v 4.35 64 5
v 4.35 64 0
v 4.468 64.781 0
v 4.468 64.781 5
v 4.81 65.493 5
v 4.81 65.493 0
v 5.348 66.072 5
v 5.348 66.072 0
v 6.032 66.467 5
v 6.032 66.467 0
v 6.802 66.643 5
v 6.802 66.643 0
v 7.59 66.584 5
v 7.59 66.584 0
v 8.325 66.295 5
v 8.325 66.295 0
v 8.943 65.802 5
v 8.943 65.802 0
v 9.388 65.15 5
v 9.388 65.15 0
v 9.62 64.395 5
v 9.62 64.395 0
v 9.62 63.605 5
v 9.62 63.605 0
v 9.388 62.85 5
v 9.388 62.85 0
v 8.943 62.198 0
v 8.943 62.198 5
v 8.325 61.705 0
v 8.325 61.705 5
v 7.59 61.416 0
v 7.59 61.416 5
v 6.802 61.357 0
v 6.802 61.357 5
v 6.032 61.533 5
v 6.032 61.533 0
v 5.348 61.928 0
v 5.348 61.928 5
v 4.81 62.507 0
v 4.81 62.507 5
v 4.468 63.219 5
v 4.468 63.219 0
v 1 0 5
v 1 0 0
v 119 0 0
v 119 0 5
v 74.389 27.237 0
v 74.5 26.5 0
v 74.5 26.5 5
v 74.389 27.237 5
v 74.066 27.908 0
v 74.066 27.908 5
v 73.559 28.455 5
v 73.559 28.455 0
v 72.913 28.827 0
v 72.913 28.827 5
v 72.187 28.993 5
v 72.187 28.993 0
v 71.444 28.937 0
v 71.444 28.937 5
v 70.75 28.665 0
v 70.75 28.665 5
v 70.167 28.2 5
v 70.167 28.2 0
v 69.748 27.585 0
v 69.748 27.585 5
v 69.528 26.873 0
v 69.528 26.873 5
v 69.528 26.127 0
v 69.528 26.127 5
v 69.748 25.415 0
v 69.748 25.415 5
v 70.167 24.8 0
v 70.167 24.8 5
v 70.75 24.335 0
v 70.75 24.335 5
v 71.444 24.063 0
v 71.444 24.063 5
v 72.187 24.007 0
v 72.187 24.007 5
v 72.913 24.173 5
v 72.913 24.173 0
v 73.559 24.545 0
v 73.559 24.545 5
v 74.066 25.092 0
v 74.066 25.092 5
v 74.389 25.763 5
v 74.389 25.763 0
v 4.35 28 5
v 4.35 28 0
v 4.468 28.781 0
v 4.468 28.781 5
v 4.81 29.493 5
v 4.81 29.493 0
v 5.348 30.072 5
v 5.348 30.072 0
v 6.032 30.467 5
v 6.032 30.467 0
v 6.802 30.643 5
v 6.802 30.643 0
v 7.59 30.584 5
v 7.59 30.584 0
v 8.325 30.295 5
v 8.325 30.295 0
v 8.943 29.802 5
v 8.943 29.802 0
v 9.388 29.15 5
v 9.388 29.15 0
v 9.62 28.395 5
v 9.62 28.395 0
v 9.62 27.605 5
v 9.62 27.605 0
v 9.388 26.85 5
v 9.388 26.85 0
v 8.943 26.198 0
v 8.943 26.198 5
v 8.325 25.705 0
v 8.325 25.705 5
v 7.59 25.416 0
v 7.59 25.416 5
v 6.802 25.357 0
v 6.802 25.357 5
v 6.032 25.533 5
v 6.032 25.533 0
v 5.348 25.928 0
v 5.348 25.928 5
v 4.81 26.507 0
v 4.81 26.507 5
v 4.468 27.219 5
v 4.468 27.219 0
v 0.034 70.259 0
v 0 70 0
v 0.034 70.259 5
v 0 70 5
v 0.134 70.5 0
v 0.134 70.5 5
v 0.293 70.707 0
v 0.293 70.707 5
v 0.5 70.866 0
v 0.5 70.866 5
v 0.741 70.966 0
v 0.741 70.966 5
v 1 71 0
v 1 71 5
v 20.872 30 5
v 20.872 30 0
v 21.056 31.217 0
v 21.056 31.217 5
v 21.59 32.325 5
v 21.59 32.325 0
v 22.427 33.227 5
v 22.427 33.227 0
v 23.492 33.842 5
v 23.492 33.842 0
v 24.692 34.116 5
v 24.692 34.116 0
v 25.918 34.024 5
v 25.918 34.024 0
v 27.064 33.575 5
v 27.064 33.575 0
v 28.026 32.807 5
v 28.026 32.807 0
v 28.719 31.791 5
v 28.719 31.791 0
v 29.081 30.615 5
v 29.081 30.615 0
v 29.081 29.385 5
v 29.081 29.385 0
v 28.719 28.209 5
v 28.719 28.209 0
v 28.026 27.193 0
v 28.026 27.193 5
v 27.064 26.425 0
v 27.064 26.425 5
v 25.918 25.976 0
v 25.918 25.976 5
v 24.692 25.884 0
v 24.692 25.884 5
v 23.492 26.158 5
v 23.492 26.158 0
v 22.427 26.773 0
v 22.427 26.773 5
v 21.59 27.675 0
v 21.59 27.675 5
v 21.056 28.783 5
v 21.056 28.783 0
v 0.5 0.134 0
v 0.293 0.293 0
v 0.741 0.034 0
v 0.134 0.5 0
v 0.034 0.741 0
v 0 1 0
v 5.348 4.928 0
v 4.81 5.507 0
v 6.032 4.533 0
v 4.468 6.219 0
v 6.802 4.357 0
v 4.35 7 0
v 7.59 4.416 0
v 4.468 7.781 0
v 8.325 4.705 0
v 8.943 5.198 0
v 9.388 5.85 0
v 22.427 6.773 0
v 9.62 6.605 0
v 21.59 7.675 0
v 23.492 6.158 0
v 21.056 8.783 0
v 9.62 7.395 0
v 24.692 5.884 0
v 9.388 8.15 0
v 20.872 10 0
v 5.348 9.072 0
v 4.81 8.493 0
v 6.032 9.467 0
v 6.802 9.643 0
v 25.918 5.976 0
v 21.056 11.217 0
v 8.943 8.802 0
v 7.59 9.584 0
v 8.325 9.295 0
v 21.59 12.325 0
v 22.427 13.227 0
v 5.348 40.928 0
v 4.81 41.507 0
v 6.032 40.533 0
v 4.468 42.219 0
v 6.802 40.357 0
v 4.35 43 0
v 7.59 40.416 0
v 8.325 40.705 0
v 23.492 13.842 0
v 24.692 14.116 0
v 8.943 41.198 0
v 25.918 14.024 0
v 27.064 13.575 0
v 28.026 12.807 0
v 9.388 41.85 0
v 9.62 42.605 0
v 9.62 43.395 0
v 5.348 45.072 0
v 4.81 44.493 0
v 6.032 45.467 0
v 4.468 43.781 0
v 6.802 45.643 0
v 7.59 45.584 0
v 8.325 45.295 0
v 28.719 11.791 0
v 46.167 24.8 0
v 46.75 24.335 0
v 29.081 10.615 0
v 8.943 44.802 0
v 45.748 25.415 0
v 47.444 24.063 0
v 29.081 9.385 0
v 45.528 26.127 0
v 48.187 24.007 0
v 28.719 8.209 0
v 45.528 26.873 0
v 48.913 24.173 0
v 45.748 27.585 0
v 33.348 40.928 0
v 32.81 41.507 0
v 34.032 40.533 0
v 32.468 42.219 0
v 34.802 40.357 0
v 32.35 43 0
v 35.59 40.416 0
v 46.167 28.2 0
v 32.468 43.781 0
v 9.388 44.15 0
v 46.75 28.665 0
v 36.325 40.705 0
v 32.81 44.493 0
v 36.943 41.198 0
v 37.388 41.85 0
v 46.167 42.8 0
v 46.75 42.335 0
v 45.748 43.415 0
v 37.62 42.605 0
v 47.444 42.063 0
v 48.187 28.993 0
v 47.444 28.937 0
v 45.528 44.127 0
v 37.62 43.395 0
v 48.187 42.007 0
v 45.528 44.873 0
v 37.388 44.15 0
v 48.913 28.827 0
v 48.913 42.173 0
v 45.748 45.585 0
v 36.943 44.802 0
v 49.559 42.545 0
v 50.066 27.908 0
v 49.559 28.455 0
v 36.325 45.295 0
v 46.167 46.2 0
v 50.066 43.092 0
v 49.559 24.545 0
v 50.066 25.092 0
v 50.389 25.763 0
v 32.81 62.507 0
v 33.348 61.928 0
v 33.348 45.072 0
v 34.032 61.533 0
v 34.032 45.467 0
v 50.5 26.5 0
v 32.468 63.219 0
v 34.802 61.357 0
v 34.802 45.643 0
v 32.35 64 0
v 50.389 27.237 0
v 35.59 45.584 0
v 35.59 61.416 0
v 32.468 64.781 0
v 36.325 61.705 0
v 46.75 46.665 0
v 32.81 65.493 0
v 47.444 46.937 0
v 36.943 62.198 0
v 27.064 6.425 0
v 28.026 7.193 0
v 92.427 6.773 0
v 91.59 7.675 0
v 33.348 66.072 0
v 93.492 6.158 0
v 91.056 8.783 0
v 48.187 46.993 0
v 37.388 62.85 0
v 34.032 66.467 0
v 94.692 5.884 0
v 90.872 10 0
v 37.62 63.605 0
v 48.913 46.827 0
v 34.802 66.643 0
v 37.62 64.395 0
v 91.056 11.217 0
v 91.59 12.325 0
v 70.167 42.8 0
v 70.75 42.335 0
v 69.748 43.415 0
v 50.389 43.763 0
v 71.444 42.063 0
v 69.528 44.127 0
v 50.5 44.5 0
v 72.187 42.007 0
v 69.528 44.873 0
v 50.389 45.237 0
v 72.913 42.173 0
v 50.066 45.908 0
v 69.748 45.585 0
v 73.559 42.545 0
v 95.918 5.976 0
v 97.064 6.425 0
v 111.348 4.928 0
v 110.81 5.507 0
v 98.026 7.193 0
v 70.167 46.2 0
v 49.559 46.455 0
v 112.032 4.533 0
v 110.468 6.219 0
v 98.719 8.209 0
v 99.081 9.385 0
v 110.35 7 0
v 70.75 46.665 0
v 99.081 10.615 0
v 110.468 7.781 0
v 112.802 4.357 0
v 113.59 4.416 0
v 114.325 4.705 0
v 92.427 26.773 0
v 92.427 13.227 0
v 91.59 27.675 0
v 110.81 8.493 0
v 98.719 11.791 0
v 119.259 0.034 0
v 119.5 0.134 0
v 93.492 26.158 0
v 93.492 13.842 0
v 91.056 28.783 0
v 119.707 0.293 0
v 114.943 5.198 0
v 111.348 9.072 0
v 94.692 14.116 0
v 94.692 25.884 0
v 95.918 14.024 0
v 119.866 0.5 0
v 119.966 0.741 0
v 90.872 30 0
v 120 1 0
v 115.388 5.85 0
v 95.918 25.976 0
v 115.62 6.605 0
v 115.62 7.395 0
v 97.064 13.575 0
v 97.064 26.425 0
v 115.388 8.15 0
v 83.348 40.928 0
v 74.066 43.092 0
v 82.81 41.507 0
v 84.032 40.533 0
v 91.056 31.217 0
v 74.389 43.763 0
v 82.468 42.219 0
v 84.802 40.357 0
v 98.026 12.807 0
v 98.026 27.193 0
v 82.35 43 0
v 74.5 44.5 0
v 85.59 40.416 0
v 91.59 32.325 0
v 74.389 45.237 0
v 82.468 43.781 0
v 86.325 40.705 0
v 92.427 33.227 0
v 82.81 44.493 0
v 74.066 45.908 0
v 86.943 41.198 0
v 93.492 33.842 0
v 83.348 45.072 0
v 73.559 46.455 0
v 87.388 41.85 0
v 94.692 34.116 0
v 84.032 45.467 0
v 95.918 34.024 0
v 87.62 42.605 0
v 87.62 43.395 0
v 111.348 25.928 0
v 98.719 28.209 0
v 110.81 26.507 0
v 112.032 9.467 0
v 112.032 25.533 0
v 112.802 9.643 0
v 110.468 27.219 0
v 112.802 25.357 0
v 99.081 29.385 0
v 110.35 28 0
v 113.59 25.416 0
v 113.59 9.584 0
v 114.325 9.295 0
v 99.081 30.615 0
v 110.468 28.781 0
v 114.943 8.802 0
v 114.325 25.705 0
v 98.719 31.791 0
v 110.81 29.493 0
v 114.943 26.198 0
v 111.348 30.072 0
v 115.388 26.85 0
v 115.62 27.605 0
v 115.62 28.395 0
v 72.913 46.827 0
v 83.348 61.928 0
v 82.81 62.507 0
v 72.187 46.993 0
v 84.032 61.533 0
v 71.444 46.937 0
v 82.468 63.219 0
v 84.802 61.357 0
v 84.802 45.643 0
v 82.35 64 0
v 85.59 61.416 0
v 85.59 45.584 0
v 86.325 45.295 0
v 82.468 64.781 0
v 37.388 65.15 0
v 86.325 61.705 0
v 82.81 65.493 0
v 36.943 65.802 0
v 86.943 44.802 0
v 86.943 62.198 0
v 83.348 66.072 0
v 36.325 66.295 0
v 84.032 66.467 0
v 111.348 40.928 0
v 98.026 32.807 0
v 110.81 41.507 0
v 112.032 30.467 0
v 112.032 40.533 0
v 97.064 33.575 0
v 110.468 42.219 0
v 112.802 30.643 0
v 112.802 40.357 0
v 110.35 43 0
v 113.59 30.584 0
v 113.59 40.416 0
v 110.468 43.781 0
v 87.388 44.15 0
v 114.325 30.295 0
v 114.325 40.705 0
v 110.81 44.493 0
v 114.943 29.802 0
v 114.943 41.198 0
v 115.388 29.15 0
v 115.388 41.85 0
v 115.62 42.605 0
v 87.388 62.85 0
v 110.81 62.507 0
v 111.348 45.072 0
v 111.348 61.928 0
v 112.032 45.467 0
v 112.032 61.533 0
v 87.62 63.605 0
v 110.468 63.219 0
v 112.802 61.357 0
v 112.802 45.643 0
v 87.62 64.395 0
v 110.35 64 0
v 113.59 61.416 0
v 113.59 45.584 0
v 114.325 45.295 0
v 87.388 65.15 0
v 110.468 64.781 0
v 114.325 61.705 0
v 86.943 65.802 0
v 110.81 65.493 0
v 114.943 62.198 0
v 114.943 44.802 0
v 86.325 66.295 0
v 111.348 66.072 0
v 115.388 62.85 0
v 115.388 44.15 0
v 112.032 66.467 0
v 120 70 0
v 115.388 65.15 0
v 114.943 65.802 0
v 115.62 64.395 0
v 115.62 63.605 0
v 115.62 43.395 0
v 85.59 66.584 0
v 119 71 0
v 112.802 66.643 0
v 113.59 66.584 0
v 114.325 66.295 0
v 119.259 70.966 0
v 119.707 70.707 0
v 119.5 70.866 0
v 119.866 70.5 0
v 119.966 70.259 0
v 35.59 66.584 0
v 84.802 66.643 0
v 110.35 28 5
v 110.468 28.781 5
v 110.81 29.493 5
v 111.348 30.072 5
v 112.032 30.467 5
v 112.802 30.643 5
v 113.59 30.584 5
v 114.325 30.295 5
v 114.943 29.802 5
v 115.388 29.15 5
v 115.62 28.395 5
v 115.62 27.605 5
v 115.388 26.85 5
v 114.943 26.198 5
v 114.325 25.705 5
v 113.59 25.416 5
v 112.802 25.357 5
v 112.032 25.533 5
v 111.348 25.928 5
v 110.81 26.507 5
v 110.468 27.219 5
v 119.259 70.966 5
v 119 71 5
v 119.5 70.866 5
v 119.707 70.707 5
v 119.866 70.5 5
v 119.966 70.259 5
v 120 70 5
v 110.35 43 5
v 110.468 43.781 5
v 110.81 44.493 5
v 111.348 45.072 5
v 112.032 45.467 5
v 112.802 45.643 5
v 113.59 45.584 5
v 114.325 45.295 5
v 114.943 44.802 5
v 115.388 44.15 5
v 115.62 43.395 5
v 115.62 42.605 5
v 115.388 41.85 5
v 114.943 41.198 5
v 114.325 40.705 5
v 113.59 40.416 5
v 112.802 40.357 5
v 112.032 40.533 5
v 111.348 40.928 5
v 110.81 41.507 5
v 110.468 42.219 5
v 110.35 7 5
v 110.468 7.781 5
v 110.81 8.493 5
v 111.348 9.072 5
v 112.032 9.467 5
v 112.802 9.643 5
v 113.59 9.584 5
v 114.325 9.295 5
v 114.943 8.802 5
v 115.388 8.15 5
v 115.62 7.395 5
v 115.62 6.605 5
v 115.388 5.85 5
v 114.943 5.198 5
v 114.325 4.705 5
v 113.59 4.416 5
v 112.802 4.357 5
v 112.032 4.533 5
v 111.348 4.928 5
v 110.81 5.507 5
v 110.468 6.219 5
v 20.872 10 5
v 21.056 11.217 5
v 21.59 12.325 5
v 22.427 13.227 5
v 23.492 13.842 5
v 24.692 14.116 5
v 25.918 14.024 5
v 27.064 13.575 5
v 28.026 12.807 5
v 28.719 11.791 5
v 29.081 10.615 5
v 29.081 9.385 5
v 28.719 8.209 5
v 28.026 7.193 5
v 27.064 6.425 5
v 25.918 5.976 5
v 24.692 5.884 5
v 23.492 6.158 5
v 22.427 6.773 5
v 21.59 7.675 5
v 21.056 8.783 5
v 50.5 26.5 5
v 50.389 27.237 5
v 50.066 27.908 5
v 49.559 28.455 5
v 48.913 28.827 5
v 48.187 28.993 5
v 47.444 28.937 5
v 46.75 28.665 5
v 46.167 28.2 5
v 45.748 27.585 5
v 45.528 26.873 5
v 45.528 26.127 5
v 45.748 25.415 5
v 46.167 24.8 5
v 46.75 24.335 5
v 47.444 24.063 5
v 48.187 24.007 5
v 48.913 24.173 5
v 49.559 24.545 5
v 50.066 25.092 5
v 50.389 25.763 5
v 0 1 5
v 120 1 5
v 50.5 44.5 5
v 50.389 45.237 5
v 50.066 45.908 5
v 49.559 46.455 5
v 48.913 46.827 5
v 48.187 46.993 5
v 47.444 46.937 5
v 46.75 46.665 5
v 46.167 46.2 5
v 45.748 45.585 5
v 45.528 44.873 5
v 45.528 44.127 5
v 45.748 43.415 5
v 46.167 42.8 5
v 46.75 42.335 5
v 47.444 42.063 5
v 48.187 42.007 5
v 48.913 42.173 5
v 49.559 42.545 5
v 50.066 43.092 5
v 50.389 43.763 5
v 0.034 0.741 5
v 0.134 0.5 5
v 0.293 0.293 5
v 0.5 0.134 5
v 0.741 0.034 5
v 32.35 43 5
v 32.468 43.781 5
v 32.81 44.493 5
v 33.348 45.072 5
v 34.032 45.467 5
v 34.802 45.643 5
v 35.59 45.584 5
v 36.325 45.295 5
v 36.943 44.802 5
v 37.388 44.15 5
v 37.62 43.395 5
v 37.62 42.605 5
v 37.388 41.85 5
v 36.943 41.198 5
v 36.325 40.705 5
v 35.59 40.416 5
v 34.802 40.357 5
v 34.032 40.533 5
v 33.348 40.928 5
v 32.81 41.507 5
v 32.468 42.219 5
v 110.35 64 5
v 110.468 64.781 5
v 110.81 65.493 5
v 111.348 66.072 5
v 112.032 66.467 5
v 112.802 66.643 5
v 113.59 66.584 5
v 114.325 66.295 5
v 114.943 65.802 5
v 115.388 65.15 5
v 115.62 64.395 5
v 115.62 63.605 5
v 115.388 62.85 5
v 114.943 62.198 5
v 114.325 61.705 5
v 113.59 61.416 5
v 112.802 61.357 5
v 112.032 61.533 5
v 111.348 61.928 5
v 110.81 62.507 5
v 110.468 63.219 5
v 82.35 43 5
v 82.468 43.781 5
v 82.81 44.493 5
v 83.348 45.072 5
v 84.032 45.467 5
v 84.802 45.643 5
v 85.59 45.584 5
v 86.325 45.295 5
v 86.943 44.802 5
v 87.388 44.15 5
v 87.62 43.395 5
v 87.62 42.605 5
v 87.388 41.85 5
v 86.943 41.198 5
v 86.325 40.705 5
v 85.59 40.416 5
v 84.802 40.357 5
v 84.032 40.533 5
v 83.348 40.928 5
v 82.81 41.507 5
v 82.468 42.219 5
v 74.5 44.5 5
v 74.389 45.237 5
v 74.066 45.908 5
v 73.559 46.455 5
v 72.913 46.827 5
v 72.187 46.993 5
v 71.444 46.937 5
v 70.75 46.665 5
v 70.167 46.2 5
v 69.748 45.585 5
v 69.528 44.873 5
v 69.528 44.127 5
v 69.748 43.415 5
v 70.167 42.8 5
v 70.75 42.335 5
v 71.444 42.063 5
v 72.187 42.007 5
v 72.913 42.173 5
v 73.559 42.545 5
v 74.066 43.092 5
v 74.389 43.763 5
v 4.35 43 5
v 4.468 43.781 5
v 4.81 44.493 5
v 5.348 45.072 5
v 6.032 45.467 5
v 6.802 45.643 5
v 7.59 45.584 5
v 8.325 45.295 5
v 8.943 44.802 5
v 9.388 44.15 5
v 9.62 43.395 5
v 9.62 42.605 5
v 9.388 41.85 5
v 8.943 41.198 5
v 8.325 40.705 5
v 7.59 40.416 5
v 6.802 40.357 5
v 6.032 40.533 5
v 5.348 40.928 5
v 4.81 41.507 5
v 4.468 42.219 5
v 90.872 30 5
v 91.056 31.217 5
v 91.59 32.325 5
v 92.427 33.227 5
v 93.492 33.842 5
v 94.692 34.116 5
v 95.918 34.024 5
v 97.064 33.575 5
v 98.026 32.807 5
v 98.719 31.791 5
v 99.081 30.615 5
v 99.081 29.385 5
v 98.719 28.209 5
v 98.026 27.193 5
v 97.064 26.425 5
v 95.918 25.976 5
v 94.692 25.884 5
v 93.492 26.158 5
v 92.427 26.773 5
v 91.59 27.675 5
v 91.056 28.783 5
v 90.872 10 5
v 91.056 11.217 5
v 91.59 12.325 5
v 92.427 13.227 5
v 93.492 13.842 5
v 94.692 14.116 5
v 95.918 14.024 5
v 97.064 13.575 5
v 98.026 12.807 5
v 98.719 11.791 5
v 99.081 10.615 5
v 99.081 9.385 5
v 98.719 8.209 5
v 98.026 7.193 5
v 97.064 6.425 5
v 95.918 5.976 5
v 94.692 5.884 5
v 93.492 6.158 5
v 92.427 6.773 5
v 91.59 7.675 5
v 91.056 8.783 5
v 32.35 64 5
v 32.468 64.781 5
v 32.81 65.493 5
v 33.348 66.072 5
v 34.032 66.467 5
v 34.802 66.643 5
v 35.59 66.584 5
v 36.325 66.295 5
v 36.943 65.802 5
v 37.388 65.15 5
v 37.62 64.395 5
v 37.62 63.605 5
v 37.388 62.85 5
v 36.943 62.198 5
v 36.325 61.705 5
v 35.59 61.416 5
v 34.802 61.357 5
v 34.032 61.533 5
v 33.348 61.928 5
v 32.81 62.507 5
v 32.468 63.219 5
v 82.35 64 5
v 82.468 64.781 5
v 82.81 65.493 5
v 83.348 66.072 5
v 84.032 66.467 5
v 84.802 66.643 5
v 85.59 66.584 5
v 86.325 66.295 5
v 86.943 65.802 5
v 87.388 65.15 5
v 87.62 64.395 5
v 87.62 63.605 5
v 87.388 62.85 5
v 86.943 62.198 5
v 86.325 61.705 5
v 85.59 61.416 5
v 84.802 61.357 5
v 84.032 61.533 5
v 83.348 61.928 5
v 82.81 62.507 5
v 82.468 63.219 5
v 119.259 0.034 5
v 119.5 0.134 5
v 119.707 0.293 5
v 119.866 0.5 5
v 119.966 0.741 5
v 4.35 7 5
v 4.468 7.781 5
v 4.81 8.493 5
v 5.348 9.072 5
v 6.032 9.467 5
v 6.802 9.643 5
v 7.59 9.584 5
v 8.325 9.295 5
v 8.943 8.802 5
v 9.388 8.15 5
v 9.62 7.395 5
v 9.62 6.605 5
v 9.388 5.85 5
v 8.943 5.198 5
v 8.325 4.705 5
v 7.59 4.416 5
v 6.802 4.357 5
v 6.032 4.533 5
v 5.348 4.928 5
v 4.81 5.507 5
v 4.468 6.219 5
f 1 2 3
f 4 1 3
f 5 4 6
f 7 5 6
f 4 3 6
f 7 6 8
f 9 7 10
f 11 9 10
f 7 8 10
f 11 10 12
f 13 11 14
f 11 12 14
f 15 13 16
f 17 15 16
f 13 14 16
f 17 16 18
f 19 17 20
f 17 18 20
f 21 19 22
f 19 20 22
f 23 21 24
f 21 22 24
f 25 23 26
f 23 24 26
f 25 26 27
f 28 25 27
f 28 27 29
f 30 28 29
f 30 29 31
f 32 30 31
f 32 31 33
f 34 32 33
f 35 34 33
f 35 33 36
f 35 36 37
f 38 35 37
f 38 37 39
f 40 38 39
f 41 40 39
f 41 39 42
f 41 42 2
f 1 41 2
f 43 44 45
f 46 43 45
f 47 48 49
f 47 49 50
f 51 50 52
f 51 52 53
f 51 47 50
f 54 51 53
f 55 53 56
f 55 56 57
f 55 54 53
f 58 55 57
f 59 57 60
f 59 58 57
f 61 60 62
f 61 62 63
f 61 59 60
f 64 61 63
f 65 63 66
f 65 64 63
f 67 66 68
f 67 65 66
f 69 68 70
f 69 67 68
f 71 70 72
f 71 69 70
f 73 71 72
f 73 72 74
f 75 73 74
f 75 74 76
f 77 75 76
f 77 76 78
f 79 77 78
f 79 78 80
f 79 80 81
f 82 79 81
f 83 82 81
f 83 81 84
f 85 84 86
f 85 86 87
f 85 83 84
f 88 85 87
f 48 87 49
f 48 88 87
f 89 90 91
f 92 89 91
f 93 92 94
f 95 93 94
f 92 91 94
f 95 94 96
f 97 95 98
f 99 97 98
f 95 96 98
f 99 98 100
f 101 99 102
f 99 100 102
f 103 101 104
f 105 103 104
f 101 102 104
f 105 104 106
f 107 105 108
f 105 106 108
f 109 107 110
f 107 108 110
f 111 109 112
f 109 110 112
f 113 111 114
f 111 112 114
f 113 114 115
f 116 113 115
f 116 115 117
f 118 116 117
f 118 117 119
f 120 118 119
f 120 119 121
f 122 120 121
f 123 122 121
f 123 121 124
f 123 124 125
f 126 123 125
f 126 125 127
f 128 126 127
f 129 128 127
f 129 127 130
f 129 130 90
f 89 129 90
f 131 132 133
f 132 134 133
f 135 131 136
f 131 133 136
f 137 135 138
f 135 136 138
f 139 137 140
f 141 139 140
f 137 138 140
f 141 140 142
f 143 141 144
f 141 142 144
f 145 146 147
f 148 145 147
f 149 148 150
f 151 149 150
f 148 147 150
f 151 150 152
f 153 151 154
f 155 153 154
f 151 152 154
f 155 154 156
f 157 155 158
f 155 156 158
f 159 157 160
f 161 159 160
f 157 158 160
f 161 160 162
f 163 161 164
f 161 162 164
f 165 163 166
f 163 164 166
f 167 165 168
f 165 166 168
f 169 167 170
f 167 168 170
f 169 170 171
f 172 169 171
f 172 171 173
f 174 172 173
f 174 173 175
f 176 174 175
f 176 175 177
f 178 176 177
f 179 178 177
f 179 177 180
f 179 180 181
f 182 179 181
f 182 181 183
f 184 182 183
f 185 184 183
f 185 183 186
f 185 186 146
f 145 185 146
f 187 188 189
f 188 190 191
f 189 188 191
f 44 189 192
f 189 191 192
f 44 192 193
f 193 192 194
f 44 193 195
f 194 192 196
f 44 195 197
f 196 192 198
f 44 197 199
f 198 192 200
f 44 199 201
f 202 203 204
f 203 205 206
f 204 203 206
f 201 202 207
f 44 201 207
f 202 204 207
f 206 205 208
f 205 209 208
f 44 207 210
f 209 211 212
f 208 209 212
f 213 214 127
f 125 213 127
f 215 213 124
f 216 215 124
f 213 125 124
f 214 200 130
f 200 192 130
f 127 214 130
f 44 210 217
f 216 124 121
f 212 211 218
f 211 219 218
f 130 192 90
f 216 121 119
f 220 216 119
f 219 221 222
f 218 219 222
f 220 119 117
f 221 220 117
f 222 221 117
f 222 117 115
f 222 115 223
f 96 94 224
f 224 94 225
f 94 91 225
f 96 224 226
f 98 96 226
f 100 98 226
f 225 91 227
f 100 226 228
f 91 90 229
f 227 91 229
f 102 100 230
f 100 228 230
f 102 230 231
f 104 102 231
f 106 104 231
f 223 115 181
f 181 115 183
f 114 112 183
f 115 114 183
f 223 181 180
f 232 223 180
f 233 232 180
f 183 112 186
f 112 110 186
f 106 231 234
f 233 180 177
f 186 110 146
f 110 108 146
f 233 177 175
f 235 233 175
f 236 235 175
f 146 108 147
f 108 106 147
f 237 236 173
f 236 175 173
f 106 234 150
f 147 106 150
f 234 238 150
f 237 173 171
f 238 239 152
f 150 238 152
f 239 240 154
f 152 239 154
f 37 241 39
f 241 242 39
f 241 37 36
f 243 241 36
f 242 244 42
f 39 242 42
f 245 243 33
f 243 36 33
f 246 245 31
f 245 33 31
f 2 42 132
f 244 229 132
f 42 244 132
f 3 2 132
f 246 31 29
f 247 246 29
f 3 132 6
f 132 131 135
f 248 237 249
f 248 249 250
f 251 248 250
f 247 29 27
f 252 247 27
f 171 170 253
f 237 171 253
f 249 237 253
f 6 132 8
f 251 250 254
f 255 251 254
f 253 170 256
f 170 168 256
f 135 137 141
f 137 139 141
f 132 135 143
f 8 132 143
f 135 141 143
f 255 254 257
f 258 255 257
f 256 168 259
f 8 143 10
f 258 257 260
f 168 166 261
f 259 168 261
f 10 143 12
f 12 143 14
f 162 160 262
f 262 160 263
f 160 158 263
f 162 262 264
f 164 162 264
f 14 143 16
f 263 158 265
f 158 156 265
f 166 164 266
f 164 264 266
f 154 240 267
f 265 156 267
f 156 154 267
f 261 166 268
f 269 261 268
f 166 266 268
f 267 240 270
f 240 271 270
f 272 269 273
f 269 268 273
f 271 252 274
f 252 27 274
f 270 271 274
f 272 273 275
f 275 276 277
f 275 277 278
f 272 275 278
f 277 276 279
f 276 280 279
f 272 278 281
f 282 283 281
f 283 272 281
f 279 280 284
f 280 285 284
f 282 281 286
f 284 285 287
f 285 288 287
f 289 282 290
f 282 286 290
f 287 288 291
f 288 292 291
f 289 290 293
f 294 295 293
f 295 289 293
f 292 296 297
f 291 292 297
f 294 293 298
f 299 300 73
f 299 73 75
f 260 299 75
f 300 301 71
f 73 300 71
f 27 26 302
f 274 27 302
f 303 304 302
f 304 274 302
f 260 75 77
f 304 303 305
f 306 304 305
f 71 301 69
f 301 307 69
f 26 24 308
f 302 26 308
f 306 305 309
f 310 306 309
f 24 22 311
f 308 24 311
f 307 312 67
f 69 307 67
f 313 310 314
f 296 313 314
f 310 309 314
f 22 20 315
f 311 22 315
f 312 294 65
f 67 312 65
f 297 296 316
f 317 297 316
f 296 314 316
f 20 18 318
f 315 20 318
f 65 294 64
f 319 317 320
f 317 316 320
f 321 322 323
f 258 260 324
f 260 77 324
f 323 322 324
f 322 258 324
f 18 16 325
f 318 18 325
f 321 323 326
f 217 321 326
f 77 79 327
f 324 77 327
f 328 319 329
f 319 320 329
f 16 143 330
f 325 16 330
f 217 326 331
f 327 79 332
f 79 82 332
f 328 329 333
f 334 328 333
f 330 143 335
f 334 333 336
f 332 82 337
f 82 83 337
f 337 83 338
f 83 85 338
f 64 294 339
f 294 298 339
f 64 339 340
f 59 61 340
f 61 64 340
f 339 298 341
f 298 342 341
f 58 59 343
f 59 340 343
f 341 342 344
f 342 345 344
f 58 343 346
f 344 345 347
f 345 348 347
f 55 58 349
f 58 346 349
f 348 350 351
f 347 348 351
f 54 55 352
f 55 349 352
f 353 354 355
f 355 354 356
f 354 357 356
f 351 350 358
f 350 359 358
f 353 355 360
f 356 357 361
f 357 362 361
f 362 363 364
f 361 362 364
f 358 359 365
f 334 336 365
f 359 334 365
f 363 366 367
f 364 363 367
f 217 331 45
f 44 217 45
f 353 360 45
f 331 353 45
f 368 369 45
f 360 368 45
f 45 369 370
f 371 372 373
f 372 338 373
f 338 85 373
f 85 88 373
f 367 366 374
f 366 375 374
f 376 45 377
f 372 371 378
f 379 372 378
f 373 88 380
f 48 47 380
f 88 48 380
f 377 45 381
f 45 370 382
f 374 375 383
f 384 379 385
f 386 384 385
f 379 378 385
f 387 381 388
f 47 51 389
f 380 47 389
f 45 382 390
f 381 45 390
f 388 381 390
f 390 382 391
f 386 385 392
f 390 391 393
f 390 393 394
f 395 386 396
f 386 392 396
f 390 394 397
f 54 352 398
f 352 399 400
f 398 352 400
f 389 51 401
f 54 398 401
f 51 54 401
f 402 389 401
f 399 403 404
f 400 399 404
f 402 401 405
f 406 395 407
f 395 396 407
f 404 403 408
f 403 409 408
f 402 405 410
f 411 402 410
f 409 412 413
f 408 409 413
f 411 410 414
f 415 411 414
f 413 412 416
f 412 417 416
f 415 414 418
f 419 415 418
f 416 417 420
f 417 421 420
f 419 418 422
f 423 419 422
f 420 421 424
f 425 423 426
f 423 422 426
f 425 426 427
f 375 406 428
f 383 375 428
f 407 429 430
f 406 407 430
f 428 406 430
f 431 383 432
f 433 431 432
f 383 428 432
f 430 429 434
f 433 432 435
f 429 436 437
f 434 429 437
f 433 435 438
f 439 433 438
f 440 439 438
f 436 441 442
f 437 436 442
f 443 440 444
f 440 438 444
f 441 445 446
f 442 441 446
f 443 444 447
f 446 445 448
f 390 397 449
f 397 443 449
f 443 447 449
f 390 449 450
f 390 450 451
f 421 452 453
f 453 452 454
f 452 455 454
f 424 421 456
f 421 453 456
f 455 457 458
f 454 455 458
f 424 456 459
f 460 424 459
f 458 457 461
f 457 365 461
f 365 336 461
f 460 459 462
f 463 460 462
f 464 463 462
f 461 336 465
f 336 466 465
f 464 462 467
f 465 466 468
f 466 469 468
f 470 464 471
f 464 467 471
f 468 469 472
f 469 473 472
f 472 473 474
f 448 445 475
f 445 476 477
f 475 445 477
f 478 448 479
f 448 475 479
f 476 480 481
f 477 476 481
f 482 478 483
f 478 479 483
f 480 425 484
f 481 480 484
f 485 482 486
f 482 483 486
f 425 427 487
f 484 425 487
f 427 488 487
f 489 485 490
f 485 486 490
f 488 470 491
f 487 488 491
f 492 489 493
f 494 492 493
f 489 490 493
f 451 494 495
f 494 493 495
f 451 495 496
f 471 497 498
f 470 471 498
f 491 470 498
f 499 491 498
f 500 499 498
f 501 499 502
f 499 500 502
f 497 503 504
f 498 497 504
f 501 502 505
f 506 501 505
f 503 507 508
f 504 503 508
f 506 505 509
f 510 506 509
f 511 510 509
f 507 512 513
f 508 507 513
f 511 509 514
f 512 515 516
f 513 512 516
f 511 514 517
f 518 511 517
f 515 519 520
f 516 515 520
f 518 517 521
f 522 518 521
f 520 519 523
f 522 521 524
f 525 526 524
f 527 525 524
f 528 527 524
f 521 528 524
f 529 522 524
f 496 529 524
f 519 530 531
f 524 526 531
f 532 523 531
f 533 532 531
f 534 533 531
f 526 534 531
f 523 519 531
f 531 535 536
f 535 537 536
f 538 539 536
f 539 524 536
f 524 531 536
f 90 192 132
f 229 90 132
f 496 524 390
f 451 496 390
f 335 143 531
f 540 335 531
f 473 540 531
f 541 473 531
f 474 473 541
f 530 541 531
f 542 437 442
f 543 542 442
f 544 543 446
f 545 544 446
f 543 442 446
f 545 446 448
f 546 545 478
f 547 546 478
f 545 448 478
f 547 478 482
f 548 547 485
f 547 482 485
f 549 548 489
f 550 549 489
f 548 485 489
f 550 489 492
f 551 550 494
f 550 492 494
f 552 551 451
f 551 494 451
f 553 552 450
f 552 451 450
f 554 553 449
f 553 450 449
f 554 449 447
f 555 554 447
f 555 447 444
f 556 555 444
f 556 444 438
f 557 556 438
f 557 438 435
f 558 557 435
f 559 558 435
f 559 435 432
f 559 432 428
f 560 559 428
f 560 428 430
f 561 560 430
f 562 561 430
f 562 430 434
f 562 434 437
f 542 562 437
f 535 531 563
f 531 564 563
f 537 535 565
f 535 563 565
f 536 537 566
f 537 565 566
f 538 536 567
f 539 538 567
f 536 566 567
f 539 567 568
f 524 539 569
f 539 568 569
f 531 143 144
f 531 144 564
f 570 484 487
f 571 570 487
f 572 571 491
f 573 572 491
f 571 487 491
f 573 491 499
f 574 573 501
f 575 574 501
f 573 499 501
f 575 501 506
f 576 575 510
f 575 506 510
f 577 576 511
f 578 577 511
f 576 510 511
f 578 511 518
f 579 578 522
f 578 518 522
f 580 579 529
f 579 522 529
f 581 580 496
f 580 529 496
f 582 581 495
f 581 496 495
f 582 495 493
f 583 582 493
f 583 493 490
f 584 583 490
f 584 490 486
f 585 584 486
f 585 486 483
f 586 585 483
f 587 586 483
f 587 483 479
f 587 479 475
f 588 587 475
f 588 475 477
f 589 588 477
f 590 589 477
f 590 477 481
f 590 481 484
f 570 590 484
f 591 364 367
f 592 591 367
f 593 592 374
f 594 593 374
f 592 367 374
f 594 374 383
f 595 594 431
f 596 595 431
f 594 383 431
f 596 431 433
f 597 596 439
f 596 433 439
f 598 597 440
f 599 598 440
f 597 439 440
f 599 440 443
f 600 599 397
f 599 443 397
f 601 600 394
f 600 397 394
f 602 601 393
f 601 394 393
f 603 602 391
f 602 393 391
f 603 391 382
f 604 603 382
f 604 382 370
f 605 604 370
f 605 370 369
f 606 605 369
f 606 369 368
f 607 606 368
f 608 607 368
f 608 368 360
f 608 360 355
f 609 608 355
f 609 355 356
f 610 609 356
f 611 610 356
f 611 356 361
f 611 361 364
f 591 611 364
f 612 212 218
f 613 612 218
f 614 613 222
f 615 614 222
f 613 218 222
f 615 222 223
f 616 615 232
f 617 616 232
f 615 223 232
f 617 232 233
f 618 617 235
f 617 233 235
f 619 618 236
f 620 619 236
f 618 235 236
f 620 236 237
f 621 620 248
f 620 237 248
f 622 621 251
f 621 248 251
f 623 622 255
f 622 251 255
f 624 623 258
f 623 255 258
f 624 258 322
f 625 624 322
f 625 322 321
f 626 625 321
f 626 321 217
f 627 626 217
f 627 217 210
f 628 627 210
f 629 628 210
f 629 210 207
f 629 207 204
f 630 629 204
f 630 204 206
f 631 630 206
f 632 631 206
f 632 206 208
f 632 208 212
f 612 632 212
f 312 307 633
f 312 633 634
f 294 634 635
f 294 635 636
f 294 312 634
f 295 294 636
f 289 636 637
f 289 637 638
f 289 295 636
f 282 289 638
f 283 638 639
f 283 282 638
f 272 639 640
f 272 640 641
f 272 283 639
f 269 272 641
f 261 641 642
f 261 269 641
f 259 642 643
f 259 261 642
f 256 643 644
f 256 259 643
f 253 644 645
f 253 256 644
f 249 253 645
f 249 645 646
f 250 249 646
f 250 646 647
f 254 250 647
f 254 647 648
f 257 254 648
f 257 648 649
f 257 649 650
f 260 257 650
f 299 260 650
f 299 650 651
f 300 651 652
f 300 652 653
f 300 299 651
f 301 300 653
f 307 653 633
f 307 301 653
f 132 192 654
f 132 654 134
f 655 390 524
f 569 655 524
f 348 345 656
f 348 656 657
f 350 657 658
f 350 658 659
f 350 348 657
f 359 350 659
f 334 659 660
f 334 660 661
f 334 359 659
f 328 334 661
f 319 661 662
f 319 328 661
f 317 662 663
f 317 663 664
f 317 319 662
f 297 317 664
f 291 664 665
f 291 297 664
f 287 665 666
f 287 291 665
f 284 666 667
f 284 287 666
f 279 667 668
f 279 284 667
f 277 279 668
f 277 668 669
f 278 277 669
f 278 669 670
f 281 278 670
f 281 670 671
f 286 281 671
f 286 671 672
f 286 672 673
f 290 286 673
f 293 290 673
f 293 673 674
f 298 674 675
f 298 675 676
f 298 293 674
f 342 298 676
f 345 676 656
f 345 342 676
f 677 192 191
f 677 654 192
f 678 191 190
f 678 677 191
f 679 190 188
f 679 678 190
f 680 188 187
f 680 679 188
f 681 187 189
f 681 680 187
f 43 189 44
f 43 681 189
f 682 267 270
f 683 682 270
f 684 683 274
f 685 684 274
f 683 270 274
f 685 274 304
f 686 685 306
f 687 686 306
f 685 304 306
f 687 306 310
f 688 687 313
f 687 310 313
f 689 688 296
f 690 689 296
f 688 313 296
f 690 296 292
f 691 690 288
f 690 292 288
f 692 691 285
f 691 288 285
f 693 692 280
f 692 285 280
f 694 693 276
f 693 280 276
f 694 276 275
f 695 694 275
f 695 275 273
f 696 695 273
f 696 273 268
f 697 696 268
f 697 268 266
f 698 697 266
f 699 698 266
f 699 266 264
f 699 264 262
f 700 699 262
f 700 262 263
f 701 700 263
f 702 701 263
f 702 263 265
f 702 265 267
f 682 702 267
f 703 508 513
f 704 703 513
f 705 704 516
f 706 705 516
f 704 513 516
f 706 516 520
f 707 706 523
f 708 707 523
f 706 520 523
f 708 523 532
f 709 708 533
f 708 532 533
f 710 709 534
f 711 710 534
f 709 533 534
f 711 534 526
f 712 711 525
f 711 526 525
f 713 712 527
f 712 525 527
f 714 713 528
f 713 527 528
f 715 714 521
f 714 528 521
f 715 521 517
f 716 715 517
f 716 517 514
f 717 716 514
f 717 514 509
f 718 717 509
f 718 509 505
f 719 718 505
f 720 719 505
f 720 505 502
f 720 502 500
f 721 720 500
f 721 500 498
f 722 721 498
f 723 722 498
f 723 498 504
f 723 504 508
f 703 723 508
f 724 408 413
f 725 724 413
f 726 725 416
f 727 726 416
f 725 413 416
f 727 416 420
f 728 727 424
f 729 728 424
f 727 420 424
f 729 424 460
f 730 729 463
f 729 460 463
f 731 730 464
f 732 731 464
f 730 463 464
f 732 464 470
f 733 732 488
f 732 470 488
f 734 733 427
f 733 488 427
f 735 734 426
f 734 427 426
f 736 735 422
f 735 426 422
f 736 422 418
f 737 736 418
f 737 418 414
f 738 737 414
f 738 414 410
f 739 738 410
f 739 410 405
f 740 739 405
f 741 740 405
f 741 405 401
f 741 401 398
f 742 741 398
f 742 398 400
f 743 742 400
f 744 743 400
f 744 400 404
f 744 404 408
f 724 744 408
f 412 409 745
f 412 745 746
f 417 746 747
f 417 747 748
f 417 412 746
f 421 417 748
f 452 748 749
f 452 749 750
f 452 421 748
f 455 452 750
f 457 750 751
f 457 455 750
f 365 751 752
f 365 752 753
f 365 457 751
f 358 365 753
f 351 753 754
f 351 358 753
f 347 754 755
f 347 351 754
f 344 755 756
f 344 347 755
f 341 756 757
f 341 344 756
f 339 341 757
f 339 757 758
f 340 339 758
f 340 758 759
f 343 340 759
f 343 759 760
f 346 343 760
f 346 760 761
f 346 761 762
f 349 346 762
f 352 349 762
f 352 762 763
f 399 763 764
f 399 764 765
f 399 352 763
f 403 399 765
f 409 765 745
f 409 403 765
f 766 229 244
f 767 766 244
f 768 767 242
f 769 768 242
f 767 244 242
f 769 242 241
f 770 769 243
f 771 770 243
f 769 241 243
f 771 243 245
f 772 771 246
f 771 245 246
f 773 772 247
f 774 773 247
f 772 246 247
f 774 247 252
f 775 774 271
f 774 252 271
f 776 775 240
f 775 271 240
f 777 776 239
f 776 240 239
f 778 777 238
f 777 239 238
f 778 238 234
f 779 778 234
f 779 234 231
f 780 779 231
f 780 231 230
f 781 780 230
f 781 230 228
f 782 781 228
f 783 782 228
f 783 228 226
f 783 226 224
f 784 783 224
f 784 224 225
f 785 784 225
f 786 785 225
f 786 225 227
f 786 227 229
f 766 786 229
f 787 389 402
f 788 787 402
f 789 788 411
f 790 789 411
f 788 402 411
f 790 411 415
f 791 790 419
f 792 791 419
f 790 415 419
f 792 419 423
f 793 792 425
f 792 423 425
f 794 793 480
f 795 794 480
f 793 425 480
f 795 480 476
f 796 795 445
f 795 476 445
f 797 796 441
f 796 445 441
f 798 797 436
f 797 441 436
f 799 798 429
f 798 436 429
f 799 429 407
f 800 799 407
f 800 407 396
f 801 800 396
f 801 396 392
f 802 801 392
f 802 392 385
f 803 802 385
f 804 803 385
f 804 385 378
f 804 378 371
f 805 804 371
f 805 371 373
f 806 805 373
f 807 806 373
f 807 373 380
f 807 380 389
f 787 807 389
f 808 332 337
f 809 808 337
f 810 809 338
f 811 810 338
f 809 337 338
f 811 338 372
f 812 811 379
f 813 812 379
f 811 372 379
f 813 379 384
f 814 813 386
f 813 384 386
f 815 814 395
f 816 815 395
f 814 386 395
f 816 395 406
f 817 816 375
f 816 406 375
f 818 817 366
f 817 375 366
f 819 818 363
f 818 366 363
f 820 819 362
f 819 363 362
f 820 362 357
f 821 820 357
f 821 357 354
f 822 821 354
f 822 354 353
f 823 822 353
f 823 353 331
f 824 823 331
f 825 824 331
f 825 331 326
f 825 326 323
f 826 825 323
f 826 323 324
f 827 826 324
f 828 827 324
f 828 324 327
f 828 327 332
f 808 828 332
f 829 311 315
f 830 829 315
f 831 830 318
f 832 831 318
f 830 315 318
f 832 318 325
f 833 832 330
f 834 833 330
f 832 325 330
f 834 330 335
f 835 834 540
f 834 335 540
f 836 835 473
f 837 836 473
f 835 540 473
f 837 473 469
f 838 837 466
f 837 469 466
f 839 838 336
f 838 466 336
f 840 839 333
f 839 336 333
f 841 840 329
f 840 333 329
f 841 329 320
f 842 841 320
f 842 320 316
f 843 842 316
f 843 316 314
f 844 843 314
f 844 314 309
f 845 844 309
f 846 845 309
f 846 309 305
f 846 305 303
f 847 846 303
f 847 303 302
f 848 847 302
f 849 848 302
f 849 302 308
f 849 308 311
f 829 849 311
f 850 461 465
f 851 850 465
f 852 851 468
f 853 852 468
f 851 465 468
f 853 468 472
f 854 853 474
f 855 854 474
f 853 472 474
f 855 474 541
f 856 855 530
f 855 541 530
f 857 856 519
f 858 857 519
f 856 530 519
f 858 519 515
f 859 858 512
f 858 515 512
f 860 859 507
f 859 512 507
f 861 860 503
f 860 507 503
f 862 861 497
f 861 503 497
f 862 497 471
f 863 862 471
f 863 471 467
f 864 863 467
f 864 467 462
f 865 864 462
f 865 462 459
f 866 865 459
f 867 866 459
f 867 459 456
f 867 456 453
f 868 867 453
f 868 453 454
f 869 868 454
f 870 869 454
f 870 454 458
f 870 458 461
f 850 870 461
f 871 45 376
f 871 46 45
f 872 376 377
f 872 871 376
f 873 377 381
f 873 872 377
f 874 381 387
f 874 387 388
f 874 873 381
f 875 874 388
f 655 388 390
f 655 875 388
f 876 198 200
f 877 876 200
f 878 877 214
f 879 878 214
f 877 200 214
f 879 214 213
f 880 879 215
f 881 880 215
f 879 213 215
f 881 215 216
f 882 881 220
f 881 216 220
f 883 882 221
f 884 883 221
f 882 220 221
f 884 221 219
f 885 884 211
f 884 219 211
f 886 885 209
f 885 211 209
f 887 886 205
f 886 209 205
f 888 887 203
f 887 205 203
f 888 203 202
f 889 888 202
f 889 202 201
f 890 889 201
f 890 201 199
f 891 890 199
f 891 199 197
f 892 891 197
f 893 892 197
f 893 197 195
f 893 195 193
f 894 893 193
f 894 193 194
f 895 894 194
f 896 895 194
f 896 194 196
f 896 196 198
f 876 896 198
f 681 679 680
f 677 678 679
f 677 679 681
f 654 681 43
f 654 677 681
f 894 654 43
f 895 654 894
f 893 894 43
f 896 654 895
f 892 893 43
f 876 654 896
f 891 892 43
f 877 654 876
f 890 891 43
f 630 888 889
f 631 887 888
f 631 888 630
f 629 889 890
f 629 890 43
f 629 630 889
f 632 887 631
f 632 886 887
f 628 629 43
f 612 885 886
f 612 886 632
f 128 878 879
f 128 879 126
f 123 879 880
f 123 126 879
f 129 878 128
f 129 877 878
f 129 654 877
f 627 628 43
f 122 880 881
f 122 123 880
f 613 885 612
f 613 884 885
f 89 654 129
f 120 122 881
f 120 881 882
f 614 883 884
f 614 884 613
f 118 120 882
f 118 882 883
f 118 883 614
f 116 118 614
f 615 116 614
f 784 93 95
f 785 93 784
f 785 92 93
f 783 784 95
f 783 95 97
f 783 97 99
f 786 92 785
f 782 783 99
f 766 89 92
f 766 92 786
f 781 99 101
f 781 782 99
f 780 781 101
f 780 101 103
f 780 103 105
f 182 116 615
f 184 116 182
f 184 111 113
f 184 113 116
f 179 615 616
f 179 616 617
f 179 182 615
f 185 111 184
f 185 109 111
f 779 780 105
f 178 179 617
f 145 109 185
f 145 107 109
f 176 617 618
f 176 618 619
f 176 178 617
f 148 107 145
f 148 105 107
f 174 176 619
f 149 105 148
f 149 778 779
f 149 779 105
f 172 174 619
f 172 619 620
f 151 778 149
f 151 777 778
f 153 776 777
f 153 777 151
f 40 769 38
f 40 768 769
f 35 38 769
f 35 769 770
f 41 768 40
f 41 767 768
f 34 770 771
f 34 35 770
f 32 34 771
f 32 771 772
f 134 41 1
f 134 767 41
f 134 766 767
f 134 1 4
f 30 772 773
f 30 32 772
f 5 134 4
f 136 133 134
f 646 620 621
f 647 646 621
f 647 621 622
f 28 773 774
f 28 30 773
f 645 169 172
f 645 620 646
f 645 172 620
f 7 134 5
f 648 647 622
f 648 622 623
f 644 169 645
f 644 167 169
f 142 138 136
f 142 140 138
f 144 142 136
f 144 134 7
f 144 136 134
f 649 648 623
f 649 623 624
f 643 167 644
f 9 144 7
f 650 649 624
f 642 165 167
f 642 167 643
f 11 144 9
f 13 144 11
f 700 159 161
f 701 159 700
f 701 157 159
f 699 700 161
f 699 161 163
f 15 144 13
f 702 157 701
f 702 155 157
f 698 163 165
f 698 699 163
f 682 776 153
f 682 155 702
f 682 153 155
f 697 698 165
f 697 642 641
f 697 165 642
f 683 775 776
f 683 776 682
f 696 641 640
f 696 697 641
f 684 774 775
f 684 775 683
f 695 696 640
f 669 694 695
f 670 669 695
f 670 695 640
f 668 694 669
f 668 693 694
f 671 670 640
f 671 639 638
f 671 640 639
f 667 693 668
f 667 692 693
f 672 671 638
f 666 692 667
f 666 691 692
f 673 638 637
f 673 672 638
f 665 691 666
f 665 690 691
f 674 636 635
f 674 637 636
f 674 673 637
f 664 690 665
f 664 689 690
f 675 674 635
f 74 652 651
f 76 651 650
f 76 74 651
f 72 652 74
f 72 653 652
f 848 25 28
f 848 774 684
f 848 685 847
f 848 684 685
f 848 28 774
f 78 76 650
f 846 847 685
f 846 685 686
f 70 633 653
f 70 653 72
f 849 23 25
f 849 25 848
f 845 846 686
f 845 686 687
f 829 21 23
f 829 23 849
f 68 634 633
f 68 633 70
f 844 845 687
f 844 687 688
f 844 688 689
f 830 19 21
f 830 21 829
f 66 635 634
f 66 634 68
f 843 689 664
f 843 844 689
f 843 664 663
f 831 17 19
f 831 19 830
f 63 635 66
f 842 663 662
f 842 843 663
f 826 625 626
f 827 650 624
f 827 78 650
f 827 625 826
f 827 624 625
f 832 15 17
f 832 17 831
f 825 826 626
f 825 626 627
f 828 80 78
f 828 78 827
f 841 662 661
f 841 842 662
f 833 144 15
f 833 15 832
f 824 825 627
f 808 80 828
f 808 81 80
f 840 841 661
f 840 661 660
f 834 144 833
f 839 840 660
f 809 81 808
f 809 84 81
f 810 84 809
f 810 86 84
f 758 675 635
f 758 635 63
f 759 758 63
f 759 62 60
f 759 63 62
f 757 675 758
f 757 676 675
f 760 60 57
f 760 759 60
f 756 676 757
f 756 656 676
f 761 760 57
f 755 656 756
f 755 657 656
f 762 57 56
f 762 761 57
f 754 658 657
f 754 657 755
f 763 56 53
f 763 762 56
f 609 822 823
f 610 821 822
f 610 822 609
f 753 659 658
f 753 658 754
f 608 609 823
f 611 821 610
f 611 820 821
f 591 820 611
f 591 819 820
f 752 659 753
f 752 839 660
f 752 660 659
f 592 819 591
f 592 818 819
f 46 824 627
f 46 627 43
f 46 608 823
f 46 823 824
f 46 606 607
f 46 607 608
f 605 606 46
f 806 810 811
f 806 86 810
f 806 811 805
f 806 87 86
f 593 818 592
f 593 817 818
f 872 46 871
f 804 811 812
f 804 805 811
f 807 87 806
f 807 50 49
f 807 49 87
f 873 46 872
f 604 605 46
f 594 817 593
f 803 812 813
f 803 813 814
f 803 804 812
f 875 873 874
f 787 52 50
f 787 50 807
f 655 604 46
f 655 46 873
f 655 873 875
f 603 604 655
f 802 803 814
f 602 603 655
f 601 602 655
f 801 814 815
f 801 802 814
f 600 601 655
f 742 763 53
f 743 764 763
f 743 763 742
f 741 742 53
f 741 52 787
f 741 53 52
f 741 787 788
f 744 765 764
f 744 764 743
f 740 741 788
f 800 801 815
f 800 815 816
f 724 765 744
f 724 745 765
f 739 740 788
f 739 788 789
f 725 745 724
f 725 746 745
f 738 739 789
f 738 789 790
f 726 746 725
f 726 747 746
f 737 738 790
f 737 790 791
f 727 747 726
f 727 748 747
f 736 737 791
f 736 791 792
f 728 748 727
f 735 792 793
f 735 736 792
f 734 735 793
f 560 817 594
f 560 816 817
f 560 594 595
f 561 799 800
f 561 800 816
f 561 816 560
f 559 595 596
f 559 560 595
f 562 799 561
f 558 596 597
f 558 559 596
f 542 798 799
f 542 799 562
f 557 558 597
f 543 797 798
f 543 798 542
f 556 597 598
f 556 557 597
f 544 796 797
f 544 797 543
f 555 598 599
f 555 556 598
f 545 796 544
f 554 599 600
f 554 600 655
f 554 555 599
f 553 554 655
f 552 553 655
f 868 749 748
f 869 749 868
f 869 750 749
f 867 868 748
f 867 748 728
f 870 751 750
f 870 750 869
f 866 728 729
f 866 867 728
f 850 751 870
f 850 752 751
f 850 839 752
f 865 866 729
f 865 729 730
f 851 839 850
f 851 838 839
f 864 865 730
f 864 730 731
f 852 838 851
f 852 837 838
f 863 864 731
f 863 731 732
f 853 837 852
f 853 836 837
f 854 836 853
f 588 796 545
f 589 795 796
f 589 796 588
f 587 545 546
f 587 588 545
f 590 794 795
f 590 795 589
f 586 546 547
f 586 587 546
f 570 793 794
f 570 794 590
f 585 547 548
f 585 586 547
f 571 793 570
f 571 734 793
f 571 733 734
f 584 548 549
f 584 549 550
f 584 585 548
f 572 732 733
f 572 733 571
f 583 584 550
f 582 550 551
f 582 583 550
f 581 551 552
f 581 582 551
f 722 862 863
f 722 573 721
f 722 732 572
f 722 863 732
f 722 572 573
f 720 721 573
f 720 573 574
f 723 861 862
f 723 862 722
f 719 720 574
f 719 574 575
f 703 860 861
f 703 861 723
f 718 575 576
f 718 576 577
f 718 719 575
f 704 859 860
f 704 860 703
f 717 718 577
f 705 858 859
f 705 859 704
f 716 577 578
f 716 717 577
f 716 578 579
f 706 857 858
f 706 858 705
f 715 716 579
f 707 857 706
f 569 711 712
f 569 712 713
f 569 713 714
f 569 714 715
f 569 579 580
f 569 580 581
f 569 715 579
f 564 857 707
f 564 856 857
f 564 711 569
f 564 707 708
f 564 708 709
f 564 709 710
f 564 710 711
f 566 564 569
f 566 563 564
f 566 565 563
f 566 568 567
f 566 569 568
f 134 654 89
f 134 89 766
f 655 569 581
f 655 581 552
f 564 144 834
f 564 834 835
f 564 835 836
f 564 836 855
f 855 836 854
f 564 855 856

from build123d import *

# Parameters (mm, degrees)
SKETCH1_W               = 120
SKETCH1_H               = 71
SKETCH1_R               = 2.5
BOSS_EXTRUDE1_DEPTH     = 5
FILLET1_R               = 1
SKETCH3_R               = 2.65
SKETCH3_R_2             = 4.1275
CUT_EXTRUDE1_DEPTH      = 39
CUT_EXTRUDE1_DEPTH_BACK = 46


with BuildPart() as part:
    # Sketch1 → Boss-Extrude1 (new body)
    with BuildSketch(Plane.XY):
        with Locations((60, 35.5)):
            Rectangle(SKETCH1_W, SKETCH1_H)
        with Locations((48, 44.5)):
            Circle(SKETCH1_R, mode=Mode.SUBTRACT)
        with Locations((72, 44.5)):
            Circle(SKETCH1_R, mode=Mode.SUBTRACT)
        with Locations((48, 26.5)):
            Circle(SKETCH1_R, mode=Mode.SUBTRACT)
        with Locations((72, 26.5)):
            Circle(SKETCH1_R, mode=Mode.SUBTRACT)
    extrude(amount=BOSS_EXTRUDE1_DEPTH)

    # Fillet1
    fillet1_edges = [part.edges().sort_by_distance(p)[0] for p in [
        (0, 71, 2.5),
        (120, 71, 2.5),
        (120, 0, 2.5),
        (0, 0, 2.5),
    ]]
    fillet(fillet1_edges, radius=FILLET1_R)

    # Sketch3 → Cut-Extrude1 (cut, two sides)
    with BuildSketch(Plane(origin=(0, 0, 0), x_dir=(-1, 0, 0), z_dir=(0, 0, -1))) as cut_extrude1_sk:
        with Locations((-113, 64)):
            Circle(SKETCH3_R)
        with Locations((-113, 43)):
            Circle(SKETCH3_R)
        with Locations((-85, 64)):
            Circle(SKETCH3_R)
        with Locations((-113, 28)):
            Circle(SKETCH3_R)
        with Locations((-113, 7)):
            Circle(SKETCH3_R)
        with Locations((-7, 7)):
            Circle(SKETCH3_R)
        with Locations((-7, 28)):
            Circle(SKETCH3_R)
        with Locations((-7, 64)):
            Circle(SKETCH3_R)
        with Locations((-7, 43)):
            Circle(SKETCH3_R)
        with Locations((-35, 64)):
            Circle(SKETCH3_R)
        with Locations((-35, 43)):
            Circle(SKETCH3_R)
        with Locations((-85, 43)):
            Circle(SKETCH3_R)
        with Locations((-25, 30)):
            Circle(SKETCH3_R_2)
        with Locations((-25, 10)):
            Circle(SKETCH3_R_2)
        with Locations((-95, 10)):
            Circle(SKETCH3_R_2)
        with Locations((-95, 30)):
            Circle(SKETCH3_R_2)
    extrude(amount=CUT_EXTRUDE1_DEPTH, mode=Mode.SUBTRACT)
    extrude(cut_extrude1_sk.sketch, amount=-CUT_EXTRUDE1_DEPTH_BACK, mode=Mode.SUBTRACT)


solid = part.part
